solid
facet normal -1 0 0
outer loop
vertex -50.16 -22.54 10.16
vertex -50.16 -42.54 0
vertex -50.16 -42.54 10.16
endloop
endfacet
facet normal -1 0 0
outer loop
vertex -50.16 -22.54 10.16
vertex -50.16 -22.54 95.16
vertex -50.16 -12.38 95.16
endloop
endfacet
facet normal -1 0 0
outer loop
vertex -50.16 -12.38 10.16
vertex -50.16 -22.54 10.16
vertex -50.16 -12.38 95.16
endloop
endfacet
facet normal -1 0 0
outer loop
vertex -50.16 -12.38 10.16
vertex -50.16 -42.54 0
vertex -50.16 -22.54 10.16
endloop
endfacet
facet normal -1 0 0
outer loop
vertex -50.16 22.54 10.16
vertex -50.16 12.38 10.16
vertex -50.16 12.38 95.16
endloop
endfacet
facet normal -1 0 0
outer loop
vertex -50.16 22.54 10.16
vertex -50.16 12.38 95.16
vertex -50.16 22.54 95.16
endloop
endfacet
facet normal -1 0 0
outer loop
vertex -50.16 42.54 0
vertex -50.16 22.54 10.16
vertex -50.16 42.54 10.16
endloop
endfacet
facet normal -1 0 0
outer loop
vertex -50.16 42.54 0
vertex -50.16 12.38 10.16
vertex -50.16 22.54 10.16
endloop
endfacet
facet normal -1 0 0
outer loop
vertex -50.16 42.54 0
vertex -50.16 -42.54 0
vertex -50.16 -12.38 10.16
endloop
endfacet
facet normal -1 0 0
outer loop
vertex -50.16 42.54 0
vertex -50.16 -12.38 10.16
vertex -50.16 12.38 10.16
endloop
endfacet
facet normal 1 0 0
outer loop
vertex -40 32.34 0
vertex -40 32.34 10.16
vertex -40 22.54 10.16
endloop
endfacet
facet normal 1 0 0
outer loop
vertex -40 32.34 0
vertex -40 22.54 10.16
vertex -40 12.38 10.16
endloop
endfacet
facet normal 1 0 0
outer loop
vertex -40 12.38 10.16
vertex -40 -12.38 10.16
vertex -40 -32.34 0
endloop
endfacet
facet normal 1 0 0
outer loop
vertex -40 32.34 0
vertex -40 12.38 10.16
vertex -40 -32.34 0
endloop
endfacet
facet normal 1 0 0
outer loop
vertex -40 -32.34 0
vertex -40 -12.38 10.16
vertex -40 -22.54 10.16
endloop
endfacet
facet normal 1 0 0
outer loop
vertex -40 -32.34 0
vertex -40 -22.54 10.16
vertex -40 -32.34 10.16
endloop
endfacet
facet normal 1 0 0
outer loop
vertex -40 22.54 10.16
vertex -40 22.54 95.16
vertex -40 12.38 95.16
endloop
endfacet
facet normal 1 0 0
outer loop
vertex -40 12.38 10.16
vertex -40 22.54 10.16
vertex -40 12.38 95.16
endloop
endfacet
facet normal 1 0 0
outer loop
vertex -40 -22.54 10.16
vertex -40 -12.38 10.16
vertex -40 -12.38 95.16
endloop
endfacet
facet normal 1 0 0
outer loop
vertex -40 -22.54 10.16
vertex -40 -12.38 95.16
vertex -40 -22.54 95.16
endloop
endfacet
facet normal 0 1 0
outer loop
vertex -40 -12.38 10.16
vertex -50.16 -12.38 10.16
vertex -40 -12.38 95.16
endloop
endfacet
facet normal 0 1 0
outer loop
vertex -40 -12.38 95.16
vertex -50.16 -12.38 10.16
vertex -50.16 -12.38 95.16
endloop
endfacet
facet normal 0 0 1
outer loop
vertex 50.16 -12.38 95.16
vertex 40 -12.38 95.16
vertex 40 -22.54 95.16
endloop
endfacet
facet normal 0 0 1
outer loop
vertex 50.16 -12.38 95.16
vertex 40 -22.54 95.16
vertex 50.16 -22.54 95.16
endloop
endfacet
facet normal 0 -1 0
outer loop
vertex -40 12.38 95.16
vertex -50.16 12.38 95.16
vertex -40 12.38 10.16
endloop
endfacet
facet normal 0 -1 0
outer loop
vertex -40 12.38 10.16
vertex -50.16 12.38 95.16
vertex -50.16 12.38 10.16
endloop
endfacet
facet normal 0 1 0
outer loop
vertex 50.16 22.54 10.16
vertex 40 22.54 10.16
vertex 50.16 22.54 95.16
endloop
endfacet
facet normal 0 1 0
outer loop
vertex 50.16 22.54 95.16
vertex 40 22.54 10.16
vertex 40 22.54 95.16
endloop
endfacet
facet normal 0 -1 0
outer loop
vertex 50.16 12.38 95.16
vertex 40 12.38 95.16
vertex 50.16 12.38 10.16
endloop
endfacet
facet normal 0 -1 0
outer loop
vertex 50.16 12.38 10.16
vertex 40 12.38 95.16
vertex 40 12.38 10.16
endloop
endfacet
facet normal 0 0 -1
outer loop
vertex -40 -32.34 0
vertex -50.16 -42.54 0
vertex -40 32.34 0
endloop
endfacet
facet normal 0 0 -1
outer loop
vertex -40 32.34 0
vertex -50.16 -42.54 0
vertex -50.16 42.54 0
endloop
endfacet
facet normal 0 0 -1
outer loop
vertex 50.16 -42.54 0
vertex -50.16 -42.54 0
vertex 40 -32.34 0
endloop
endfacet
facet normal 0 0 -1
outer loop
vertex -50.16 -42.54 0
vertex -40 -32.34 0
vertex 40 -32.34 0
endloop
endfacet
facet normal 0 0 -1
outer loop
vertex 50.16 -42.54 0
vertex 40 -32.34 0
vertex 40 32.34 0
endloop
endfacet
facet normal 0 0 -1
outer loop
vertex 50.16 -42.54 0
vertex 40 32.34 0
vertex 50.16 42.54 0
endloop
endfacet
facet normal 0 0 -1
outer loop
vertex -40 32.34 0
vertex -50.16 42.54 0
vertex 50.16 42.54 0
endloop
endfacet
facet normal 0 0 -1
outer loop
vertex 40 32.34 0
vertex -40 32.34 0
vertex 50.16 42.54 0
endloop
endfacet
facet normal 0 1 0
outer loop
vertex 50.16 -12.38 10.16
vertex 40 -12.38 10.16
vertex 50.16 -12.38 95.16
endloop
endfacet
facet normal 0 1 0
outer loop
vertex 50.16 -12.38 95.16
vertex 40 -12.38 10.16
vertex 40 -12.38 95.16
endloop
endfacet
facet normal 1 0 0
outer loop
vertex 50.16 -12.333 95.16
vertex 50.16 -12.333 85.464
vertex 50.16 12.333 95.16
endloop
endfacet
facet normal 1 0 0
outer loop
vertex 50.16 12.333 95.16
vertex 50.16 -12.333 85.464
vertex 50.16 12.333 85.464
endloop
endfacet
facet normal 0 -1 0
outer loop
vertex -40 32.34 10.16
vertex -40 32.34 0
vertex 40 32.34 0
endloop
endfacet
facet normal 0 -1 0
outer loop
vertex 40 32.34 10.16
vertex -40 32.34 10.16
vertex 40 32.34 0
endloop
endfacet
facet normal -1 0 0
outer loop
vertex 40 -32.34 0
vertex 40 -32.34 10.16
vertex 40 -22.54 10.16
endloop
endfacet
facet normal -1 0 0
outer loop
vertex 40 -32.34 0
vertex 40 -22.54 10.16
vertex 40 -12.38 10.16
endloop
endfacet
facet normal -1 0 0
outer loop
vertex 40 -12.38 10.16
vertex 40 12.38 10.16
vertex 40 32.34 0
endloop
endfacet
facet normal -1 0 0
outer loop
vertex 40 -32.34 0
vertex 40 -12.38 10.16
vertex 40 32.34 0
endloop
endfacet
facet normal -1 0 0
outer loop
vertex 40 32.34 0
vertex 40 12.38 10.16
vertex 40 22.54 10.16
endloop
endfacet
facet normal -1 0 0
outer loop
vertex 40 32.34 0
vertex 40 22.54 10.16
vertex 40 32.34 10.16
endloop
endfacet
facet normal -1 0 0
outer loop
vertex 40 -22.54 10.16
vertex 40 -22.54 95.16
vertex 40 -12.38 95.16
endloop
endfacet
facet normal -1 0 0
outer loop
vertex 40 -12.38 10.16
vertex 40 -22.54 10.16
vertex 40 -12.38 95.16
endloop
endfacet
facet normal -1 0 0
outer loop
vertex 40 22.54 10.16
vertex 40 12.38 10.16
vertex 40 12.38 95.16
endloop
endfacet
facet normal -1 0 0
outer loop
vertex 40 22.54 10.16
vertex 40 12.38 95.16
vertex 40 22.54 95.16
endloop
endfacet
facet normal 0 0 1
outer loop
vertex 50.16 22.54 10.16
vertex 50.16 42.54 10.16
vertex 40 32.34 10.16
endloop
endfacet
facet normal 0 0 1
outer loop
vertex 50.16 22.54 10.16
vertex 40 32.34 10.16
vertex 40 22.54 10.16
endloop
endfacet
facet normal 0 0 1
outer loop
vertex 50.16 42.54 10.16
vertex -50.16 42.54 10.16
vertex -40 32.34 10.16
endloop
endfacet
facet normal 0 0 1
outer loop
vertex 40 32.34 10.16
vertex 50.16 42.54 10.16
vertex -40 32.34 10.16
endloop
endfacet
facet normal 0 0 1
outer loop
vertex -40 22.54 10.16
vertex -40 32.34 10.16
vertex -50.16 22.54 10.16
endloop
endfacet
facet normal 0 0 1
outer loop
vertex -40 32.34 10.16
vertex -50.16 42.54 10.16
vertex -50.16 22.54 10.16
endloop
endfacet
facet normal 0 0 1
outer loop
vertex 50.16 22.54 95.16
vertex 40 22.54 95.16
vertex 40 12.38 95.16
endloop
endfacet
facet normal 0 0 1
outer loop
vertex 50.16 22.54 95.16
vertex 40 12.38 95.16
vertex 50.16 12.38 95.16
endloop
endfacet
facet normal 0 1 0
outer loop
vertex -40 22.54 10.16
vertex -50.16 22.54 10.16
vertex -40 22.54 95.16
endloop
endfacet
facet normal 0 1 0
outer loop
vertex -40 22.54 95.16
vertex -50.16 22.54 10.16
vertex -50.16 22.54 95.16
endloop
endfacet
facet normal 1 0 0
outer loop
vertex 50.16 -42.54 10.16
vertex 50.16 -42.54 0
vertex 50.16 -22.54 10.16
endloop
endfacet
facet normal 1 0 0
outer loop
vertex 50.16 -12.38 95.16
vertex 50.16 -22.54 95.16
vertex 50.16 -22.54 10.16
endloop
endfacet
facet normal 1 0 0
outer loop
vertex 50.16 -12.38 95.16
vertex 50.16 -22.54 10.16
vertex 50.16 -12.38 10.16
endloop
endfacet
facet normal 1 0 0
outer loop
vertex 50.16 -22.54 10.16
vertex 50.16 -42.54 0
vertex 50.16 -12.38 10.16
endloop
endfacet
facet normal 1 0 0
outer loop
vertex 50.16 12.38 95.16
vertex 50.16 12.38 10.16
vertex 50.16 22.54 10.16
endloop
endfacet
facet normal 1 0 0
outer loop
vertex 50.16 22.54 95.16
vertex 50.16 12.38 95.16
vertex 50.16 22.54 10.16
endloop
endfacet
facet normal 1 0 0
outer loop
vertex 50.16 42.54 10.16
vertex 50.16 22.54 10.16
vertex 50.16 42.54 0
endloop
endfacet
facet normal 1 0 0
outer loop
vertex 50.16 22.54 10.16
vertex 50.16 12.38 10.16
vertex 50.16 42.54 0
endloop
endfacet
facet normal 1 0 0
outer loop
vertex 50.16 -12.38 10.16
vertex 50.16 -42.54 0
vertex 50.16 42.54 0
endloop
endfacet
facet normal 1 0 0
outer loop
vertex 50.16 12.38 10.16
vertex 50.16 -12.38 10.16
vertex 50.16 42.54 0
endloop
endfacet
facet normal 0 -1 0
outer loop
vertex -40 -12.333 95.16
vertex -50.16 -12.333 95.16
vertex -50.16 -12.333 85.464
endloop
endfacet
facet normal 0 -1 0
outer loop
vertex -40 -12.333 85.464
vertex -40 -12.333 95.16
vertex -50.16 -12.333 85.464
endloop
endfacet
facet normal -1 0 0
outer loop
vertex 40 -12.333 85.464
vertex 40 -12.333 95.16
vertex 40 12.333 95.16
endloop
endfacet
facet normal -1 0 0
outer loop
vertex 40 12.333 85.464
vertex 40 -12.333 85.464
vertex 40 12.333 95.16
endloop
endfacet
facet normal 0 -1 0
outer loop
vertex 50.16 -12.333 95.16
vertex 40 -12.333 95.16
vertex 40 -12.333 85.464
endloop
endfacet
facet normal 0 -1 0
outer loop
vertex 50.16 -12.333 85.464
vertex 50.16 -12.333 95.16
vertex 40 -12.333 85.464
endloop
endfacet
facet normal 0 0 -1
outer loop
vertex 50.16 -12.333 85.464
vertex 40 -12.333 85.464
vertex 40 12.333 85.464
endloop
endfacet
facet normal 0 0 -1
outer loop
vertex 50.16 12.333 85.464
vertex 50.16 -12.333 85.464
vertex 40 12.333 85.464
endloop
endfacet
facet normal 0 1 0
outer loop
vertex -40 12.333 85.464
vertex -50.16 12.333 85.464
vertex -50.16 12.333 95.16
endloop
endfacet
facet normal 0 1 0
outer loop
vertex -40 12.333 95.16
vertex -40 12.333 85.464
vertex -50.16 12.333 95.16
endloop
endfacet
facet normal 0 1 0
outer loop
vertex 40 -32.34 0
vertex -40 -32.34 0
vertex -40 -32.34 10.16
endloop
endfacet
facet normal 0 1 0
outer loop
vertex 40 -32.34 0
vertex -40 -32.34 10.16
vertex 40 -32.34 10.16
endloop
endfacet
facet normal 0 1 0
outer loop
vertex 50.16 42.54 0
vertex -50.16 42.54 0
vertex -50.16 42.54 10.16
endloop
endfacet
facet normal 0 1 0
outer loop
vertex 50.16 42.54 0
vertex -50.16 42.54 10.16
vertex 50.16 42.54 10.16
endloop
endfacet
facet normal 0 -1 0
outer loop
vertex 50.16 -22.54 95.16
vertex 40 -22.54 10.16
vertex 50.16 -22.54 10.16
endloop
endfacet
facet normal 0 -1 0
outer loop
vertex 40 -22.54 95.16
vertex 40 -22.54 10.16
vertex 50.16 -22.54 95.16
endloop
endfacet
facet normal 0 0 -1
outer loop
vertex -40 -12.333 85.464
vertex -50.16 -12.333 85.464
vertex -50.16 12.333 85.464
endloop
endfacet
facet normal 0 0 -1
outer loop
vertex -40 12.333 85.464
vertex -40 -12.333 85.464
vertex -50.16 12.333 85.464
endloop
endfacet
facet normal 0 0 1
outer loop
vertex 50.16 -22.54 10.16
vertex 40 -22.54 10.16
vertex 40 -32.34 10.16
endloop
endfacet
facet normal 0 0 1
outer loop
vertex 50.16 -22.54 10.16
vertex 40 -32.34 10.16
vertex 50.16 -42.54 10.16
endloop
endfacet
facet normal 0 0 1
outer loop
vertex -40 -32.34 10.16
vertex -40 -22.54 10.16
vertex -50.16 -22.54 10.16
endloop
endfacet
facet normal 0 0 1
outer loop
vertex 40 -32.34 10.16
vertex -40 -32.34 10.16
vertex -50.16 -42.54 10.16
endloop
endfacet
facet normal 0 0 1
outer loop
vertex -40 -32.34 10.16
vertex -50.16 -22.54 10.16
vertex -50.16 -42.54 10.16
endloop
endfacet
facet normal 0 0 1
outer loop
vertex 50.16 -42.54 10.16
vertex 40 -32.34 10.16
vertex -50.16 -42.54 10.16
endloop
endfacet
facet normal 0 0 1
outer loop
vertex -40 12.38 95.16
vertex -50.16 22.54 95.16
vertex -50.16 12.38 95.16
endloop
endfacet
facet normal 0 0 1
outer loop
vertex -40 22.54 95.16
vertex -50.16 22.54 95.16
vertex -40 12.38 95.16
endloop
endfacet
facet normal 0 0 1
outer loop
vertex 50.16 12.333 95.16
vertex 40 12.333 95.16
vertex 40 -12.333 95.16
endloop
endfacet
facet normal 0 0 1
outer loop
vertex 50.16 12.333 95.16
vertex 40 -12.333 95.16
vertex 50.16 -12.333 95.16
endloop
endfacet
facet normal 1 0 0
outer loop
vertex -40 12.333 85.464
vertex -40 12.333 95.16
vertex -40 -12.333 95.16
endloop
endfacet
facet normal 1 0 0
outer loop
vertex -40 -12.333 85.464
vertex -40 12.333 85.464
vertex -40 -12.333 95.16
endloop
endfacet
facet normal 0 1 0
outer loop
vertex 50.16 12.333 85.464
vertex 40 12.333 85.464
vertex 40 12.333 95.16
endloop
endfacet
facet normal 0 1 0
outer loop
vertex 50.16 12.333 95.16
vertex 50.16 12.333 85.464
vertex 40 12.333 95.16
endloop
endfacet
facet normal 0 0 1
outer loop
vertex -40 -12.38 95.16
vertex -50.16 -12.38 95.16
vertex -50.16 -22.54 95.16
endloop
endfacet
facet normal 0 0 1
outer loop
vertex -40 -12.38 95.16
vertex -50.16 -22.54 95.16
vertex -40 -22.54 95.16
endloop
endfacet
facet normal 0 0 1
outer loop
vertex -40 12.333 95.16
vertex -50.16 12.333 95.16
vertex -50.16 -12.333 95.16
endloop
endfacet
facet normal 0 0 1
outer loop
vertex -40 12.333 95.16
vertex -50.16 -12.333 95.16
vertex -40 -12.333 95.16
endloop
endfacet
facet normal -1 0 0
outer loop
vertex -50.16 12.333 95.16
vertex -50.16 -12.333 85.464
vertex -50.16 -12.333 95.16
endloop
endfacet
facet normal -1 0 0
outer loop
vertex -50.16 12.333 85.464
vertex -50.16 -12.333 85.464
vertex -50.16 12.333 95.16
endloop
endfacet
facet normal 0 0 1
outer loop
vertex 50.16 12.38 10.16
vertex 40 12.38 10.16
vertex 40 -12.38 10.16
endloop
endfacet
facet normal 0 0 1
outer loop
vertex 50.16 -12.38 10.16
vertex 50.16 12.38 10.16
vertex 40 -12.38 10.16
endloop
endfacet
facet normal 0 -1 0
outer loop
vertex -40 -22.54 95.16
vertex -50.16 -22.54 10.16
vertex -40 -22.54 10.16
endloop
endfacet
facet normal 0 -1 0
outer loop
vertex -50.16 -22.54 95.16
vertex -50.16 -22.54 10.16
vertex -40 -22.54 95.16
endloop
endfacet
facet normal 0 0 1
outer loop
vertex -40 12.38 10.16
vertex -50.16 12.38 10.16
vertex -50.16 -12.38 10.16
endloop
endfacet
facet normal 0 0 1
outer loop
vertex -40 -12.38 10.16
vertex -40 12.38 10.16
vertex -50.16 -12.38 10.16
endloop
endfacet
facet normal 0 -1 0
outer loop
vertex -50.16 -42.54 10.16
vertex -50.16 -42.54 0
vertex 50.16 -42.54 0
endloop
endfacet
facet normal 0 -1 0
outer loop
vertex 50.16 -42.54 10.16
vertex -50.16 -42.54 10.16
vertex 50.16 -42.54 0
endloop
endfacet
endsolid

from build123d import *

# Parameters (mm, degrees)
F0_W     = 100.32
F0_H     = 85.08
F2_DEPTH = 95.16
F1_W     = 80
F1_H     = 64.68
F3_DEPTH = 85
F4_W     = 80
F4_H     = 10.2
F4_H_2   = 64.68
F5_DEPTH = 74.84
F6_W     = 20
F6_H     = 85
F7_DEPTH = 100.321


with BuildPart() as f2:
    # F0 (on Top) → F2 (new body)
    with BuildSketch(Plane.XY):
        Rectangle(F0_W, F0_H)
    extrude(amount=F2_DEPTH)

    # F1 (on face) → F3 (cut)
    with BuildSketch(Plane.XY):
        Rectangle(F1_W, F1_H)
    extrude(amount=F3_DEPTH, mode=Mode.SUBTRACT)

    # F4 (on face) → F5 (cut)
    with BuildSketch(Plane.XY.offset(95.16)):
        with Locations((0, -37.44)):
            Rectangle(F4_W, F4_H)
        with Locations((0, 37.44)):
            Rectangle(F4_W, F4_H)
        Rectangle(F4_W, F4_H_2)
    extrude(amount=-F5_DEPTH, mode=Mode.SUBTRACT)

    # F6 (on face) → F7 (cut, through all)
    with BuildSketch(Plane(origin=(-50.16, 0, 0), x_dir=(0, -1, 0), z_dir=(-1, 0, 0))):
        with Locations((-32.54, 52.66)):
            Rectangle(F6_W, F6_H)
        Polygon((-12.38, 95.16), (-12.38, 10.16), (12.38, 10.16), (12.38, 95.16), (12.333148, 95.16), (12.333148, 85.46385), (-12.333161, 85.46385), (-12.333161, 95.16), align=None)
        with Locations((32.54, 52.66)):
            Rectangle(F6_W, F6_H)
    extrude(amount=-F7_DEPTH, mode=Mode.SUBTRACT)


solid = f2.part
